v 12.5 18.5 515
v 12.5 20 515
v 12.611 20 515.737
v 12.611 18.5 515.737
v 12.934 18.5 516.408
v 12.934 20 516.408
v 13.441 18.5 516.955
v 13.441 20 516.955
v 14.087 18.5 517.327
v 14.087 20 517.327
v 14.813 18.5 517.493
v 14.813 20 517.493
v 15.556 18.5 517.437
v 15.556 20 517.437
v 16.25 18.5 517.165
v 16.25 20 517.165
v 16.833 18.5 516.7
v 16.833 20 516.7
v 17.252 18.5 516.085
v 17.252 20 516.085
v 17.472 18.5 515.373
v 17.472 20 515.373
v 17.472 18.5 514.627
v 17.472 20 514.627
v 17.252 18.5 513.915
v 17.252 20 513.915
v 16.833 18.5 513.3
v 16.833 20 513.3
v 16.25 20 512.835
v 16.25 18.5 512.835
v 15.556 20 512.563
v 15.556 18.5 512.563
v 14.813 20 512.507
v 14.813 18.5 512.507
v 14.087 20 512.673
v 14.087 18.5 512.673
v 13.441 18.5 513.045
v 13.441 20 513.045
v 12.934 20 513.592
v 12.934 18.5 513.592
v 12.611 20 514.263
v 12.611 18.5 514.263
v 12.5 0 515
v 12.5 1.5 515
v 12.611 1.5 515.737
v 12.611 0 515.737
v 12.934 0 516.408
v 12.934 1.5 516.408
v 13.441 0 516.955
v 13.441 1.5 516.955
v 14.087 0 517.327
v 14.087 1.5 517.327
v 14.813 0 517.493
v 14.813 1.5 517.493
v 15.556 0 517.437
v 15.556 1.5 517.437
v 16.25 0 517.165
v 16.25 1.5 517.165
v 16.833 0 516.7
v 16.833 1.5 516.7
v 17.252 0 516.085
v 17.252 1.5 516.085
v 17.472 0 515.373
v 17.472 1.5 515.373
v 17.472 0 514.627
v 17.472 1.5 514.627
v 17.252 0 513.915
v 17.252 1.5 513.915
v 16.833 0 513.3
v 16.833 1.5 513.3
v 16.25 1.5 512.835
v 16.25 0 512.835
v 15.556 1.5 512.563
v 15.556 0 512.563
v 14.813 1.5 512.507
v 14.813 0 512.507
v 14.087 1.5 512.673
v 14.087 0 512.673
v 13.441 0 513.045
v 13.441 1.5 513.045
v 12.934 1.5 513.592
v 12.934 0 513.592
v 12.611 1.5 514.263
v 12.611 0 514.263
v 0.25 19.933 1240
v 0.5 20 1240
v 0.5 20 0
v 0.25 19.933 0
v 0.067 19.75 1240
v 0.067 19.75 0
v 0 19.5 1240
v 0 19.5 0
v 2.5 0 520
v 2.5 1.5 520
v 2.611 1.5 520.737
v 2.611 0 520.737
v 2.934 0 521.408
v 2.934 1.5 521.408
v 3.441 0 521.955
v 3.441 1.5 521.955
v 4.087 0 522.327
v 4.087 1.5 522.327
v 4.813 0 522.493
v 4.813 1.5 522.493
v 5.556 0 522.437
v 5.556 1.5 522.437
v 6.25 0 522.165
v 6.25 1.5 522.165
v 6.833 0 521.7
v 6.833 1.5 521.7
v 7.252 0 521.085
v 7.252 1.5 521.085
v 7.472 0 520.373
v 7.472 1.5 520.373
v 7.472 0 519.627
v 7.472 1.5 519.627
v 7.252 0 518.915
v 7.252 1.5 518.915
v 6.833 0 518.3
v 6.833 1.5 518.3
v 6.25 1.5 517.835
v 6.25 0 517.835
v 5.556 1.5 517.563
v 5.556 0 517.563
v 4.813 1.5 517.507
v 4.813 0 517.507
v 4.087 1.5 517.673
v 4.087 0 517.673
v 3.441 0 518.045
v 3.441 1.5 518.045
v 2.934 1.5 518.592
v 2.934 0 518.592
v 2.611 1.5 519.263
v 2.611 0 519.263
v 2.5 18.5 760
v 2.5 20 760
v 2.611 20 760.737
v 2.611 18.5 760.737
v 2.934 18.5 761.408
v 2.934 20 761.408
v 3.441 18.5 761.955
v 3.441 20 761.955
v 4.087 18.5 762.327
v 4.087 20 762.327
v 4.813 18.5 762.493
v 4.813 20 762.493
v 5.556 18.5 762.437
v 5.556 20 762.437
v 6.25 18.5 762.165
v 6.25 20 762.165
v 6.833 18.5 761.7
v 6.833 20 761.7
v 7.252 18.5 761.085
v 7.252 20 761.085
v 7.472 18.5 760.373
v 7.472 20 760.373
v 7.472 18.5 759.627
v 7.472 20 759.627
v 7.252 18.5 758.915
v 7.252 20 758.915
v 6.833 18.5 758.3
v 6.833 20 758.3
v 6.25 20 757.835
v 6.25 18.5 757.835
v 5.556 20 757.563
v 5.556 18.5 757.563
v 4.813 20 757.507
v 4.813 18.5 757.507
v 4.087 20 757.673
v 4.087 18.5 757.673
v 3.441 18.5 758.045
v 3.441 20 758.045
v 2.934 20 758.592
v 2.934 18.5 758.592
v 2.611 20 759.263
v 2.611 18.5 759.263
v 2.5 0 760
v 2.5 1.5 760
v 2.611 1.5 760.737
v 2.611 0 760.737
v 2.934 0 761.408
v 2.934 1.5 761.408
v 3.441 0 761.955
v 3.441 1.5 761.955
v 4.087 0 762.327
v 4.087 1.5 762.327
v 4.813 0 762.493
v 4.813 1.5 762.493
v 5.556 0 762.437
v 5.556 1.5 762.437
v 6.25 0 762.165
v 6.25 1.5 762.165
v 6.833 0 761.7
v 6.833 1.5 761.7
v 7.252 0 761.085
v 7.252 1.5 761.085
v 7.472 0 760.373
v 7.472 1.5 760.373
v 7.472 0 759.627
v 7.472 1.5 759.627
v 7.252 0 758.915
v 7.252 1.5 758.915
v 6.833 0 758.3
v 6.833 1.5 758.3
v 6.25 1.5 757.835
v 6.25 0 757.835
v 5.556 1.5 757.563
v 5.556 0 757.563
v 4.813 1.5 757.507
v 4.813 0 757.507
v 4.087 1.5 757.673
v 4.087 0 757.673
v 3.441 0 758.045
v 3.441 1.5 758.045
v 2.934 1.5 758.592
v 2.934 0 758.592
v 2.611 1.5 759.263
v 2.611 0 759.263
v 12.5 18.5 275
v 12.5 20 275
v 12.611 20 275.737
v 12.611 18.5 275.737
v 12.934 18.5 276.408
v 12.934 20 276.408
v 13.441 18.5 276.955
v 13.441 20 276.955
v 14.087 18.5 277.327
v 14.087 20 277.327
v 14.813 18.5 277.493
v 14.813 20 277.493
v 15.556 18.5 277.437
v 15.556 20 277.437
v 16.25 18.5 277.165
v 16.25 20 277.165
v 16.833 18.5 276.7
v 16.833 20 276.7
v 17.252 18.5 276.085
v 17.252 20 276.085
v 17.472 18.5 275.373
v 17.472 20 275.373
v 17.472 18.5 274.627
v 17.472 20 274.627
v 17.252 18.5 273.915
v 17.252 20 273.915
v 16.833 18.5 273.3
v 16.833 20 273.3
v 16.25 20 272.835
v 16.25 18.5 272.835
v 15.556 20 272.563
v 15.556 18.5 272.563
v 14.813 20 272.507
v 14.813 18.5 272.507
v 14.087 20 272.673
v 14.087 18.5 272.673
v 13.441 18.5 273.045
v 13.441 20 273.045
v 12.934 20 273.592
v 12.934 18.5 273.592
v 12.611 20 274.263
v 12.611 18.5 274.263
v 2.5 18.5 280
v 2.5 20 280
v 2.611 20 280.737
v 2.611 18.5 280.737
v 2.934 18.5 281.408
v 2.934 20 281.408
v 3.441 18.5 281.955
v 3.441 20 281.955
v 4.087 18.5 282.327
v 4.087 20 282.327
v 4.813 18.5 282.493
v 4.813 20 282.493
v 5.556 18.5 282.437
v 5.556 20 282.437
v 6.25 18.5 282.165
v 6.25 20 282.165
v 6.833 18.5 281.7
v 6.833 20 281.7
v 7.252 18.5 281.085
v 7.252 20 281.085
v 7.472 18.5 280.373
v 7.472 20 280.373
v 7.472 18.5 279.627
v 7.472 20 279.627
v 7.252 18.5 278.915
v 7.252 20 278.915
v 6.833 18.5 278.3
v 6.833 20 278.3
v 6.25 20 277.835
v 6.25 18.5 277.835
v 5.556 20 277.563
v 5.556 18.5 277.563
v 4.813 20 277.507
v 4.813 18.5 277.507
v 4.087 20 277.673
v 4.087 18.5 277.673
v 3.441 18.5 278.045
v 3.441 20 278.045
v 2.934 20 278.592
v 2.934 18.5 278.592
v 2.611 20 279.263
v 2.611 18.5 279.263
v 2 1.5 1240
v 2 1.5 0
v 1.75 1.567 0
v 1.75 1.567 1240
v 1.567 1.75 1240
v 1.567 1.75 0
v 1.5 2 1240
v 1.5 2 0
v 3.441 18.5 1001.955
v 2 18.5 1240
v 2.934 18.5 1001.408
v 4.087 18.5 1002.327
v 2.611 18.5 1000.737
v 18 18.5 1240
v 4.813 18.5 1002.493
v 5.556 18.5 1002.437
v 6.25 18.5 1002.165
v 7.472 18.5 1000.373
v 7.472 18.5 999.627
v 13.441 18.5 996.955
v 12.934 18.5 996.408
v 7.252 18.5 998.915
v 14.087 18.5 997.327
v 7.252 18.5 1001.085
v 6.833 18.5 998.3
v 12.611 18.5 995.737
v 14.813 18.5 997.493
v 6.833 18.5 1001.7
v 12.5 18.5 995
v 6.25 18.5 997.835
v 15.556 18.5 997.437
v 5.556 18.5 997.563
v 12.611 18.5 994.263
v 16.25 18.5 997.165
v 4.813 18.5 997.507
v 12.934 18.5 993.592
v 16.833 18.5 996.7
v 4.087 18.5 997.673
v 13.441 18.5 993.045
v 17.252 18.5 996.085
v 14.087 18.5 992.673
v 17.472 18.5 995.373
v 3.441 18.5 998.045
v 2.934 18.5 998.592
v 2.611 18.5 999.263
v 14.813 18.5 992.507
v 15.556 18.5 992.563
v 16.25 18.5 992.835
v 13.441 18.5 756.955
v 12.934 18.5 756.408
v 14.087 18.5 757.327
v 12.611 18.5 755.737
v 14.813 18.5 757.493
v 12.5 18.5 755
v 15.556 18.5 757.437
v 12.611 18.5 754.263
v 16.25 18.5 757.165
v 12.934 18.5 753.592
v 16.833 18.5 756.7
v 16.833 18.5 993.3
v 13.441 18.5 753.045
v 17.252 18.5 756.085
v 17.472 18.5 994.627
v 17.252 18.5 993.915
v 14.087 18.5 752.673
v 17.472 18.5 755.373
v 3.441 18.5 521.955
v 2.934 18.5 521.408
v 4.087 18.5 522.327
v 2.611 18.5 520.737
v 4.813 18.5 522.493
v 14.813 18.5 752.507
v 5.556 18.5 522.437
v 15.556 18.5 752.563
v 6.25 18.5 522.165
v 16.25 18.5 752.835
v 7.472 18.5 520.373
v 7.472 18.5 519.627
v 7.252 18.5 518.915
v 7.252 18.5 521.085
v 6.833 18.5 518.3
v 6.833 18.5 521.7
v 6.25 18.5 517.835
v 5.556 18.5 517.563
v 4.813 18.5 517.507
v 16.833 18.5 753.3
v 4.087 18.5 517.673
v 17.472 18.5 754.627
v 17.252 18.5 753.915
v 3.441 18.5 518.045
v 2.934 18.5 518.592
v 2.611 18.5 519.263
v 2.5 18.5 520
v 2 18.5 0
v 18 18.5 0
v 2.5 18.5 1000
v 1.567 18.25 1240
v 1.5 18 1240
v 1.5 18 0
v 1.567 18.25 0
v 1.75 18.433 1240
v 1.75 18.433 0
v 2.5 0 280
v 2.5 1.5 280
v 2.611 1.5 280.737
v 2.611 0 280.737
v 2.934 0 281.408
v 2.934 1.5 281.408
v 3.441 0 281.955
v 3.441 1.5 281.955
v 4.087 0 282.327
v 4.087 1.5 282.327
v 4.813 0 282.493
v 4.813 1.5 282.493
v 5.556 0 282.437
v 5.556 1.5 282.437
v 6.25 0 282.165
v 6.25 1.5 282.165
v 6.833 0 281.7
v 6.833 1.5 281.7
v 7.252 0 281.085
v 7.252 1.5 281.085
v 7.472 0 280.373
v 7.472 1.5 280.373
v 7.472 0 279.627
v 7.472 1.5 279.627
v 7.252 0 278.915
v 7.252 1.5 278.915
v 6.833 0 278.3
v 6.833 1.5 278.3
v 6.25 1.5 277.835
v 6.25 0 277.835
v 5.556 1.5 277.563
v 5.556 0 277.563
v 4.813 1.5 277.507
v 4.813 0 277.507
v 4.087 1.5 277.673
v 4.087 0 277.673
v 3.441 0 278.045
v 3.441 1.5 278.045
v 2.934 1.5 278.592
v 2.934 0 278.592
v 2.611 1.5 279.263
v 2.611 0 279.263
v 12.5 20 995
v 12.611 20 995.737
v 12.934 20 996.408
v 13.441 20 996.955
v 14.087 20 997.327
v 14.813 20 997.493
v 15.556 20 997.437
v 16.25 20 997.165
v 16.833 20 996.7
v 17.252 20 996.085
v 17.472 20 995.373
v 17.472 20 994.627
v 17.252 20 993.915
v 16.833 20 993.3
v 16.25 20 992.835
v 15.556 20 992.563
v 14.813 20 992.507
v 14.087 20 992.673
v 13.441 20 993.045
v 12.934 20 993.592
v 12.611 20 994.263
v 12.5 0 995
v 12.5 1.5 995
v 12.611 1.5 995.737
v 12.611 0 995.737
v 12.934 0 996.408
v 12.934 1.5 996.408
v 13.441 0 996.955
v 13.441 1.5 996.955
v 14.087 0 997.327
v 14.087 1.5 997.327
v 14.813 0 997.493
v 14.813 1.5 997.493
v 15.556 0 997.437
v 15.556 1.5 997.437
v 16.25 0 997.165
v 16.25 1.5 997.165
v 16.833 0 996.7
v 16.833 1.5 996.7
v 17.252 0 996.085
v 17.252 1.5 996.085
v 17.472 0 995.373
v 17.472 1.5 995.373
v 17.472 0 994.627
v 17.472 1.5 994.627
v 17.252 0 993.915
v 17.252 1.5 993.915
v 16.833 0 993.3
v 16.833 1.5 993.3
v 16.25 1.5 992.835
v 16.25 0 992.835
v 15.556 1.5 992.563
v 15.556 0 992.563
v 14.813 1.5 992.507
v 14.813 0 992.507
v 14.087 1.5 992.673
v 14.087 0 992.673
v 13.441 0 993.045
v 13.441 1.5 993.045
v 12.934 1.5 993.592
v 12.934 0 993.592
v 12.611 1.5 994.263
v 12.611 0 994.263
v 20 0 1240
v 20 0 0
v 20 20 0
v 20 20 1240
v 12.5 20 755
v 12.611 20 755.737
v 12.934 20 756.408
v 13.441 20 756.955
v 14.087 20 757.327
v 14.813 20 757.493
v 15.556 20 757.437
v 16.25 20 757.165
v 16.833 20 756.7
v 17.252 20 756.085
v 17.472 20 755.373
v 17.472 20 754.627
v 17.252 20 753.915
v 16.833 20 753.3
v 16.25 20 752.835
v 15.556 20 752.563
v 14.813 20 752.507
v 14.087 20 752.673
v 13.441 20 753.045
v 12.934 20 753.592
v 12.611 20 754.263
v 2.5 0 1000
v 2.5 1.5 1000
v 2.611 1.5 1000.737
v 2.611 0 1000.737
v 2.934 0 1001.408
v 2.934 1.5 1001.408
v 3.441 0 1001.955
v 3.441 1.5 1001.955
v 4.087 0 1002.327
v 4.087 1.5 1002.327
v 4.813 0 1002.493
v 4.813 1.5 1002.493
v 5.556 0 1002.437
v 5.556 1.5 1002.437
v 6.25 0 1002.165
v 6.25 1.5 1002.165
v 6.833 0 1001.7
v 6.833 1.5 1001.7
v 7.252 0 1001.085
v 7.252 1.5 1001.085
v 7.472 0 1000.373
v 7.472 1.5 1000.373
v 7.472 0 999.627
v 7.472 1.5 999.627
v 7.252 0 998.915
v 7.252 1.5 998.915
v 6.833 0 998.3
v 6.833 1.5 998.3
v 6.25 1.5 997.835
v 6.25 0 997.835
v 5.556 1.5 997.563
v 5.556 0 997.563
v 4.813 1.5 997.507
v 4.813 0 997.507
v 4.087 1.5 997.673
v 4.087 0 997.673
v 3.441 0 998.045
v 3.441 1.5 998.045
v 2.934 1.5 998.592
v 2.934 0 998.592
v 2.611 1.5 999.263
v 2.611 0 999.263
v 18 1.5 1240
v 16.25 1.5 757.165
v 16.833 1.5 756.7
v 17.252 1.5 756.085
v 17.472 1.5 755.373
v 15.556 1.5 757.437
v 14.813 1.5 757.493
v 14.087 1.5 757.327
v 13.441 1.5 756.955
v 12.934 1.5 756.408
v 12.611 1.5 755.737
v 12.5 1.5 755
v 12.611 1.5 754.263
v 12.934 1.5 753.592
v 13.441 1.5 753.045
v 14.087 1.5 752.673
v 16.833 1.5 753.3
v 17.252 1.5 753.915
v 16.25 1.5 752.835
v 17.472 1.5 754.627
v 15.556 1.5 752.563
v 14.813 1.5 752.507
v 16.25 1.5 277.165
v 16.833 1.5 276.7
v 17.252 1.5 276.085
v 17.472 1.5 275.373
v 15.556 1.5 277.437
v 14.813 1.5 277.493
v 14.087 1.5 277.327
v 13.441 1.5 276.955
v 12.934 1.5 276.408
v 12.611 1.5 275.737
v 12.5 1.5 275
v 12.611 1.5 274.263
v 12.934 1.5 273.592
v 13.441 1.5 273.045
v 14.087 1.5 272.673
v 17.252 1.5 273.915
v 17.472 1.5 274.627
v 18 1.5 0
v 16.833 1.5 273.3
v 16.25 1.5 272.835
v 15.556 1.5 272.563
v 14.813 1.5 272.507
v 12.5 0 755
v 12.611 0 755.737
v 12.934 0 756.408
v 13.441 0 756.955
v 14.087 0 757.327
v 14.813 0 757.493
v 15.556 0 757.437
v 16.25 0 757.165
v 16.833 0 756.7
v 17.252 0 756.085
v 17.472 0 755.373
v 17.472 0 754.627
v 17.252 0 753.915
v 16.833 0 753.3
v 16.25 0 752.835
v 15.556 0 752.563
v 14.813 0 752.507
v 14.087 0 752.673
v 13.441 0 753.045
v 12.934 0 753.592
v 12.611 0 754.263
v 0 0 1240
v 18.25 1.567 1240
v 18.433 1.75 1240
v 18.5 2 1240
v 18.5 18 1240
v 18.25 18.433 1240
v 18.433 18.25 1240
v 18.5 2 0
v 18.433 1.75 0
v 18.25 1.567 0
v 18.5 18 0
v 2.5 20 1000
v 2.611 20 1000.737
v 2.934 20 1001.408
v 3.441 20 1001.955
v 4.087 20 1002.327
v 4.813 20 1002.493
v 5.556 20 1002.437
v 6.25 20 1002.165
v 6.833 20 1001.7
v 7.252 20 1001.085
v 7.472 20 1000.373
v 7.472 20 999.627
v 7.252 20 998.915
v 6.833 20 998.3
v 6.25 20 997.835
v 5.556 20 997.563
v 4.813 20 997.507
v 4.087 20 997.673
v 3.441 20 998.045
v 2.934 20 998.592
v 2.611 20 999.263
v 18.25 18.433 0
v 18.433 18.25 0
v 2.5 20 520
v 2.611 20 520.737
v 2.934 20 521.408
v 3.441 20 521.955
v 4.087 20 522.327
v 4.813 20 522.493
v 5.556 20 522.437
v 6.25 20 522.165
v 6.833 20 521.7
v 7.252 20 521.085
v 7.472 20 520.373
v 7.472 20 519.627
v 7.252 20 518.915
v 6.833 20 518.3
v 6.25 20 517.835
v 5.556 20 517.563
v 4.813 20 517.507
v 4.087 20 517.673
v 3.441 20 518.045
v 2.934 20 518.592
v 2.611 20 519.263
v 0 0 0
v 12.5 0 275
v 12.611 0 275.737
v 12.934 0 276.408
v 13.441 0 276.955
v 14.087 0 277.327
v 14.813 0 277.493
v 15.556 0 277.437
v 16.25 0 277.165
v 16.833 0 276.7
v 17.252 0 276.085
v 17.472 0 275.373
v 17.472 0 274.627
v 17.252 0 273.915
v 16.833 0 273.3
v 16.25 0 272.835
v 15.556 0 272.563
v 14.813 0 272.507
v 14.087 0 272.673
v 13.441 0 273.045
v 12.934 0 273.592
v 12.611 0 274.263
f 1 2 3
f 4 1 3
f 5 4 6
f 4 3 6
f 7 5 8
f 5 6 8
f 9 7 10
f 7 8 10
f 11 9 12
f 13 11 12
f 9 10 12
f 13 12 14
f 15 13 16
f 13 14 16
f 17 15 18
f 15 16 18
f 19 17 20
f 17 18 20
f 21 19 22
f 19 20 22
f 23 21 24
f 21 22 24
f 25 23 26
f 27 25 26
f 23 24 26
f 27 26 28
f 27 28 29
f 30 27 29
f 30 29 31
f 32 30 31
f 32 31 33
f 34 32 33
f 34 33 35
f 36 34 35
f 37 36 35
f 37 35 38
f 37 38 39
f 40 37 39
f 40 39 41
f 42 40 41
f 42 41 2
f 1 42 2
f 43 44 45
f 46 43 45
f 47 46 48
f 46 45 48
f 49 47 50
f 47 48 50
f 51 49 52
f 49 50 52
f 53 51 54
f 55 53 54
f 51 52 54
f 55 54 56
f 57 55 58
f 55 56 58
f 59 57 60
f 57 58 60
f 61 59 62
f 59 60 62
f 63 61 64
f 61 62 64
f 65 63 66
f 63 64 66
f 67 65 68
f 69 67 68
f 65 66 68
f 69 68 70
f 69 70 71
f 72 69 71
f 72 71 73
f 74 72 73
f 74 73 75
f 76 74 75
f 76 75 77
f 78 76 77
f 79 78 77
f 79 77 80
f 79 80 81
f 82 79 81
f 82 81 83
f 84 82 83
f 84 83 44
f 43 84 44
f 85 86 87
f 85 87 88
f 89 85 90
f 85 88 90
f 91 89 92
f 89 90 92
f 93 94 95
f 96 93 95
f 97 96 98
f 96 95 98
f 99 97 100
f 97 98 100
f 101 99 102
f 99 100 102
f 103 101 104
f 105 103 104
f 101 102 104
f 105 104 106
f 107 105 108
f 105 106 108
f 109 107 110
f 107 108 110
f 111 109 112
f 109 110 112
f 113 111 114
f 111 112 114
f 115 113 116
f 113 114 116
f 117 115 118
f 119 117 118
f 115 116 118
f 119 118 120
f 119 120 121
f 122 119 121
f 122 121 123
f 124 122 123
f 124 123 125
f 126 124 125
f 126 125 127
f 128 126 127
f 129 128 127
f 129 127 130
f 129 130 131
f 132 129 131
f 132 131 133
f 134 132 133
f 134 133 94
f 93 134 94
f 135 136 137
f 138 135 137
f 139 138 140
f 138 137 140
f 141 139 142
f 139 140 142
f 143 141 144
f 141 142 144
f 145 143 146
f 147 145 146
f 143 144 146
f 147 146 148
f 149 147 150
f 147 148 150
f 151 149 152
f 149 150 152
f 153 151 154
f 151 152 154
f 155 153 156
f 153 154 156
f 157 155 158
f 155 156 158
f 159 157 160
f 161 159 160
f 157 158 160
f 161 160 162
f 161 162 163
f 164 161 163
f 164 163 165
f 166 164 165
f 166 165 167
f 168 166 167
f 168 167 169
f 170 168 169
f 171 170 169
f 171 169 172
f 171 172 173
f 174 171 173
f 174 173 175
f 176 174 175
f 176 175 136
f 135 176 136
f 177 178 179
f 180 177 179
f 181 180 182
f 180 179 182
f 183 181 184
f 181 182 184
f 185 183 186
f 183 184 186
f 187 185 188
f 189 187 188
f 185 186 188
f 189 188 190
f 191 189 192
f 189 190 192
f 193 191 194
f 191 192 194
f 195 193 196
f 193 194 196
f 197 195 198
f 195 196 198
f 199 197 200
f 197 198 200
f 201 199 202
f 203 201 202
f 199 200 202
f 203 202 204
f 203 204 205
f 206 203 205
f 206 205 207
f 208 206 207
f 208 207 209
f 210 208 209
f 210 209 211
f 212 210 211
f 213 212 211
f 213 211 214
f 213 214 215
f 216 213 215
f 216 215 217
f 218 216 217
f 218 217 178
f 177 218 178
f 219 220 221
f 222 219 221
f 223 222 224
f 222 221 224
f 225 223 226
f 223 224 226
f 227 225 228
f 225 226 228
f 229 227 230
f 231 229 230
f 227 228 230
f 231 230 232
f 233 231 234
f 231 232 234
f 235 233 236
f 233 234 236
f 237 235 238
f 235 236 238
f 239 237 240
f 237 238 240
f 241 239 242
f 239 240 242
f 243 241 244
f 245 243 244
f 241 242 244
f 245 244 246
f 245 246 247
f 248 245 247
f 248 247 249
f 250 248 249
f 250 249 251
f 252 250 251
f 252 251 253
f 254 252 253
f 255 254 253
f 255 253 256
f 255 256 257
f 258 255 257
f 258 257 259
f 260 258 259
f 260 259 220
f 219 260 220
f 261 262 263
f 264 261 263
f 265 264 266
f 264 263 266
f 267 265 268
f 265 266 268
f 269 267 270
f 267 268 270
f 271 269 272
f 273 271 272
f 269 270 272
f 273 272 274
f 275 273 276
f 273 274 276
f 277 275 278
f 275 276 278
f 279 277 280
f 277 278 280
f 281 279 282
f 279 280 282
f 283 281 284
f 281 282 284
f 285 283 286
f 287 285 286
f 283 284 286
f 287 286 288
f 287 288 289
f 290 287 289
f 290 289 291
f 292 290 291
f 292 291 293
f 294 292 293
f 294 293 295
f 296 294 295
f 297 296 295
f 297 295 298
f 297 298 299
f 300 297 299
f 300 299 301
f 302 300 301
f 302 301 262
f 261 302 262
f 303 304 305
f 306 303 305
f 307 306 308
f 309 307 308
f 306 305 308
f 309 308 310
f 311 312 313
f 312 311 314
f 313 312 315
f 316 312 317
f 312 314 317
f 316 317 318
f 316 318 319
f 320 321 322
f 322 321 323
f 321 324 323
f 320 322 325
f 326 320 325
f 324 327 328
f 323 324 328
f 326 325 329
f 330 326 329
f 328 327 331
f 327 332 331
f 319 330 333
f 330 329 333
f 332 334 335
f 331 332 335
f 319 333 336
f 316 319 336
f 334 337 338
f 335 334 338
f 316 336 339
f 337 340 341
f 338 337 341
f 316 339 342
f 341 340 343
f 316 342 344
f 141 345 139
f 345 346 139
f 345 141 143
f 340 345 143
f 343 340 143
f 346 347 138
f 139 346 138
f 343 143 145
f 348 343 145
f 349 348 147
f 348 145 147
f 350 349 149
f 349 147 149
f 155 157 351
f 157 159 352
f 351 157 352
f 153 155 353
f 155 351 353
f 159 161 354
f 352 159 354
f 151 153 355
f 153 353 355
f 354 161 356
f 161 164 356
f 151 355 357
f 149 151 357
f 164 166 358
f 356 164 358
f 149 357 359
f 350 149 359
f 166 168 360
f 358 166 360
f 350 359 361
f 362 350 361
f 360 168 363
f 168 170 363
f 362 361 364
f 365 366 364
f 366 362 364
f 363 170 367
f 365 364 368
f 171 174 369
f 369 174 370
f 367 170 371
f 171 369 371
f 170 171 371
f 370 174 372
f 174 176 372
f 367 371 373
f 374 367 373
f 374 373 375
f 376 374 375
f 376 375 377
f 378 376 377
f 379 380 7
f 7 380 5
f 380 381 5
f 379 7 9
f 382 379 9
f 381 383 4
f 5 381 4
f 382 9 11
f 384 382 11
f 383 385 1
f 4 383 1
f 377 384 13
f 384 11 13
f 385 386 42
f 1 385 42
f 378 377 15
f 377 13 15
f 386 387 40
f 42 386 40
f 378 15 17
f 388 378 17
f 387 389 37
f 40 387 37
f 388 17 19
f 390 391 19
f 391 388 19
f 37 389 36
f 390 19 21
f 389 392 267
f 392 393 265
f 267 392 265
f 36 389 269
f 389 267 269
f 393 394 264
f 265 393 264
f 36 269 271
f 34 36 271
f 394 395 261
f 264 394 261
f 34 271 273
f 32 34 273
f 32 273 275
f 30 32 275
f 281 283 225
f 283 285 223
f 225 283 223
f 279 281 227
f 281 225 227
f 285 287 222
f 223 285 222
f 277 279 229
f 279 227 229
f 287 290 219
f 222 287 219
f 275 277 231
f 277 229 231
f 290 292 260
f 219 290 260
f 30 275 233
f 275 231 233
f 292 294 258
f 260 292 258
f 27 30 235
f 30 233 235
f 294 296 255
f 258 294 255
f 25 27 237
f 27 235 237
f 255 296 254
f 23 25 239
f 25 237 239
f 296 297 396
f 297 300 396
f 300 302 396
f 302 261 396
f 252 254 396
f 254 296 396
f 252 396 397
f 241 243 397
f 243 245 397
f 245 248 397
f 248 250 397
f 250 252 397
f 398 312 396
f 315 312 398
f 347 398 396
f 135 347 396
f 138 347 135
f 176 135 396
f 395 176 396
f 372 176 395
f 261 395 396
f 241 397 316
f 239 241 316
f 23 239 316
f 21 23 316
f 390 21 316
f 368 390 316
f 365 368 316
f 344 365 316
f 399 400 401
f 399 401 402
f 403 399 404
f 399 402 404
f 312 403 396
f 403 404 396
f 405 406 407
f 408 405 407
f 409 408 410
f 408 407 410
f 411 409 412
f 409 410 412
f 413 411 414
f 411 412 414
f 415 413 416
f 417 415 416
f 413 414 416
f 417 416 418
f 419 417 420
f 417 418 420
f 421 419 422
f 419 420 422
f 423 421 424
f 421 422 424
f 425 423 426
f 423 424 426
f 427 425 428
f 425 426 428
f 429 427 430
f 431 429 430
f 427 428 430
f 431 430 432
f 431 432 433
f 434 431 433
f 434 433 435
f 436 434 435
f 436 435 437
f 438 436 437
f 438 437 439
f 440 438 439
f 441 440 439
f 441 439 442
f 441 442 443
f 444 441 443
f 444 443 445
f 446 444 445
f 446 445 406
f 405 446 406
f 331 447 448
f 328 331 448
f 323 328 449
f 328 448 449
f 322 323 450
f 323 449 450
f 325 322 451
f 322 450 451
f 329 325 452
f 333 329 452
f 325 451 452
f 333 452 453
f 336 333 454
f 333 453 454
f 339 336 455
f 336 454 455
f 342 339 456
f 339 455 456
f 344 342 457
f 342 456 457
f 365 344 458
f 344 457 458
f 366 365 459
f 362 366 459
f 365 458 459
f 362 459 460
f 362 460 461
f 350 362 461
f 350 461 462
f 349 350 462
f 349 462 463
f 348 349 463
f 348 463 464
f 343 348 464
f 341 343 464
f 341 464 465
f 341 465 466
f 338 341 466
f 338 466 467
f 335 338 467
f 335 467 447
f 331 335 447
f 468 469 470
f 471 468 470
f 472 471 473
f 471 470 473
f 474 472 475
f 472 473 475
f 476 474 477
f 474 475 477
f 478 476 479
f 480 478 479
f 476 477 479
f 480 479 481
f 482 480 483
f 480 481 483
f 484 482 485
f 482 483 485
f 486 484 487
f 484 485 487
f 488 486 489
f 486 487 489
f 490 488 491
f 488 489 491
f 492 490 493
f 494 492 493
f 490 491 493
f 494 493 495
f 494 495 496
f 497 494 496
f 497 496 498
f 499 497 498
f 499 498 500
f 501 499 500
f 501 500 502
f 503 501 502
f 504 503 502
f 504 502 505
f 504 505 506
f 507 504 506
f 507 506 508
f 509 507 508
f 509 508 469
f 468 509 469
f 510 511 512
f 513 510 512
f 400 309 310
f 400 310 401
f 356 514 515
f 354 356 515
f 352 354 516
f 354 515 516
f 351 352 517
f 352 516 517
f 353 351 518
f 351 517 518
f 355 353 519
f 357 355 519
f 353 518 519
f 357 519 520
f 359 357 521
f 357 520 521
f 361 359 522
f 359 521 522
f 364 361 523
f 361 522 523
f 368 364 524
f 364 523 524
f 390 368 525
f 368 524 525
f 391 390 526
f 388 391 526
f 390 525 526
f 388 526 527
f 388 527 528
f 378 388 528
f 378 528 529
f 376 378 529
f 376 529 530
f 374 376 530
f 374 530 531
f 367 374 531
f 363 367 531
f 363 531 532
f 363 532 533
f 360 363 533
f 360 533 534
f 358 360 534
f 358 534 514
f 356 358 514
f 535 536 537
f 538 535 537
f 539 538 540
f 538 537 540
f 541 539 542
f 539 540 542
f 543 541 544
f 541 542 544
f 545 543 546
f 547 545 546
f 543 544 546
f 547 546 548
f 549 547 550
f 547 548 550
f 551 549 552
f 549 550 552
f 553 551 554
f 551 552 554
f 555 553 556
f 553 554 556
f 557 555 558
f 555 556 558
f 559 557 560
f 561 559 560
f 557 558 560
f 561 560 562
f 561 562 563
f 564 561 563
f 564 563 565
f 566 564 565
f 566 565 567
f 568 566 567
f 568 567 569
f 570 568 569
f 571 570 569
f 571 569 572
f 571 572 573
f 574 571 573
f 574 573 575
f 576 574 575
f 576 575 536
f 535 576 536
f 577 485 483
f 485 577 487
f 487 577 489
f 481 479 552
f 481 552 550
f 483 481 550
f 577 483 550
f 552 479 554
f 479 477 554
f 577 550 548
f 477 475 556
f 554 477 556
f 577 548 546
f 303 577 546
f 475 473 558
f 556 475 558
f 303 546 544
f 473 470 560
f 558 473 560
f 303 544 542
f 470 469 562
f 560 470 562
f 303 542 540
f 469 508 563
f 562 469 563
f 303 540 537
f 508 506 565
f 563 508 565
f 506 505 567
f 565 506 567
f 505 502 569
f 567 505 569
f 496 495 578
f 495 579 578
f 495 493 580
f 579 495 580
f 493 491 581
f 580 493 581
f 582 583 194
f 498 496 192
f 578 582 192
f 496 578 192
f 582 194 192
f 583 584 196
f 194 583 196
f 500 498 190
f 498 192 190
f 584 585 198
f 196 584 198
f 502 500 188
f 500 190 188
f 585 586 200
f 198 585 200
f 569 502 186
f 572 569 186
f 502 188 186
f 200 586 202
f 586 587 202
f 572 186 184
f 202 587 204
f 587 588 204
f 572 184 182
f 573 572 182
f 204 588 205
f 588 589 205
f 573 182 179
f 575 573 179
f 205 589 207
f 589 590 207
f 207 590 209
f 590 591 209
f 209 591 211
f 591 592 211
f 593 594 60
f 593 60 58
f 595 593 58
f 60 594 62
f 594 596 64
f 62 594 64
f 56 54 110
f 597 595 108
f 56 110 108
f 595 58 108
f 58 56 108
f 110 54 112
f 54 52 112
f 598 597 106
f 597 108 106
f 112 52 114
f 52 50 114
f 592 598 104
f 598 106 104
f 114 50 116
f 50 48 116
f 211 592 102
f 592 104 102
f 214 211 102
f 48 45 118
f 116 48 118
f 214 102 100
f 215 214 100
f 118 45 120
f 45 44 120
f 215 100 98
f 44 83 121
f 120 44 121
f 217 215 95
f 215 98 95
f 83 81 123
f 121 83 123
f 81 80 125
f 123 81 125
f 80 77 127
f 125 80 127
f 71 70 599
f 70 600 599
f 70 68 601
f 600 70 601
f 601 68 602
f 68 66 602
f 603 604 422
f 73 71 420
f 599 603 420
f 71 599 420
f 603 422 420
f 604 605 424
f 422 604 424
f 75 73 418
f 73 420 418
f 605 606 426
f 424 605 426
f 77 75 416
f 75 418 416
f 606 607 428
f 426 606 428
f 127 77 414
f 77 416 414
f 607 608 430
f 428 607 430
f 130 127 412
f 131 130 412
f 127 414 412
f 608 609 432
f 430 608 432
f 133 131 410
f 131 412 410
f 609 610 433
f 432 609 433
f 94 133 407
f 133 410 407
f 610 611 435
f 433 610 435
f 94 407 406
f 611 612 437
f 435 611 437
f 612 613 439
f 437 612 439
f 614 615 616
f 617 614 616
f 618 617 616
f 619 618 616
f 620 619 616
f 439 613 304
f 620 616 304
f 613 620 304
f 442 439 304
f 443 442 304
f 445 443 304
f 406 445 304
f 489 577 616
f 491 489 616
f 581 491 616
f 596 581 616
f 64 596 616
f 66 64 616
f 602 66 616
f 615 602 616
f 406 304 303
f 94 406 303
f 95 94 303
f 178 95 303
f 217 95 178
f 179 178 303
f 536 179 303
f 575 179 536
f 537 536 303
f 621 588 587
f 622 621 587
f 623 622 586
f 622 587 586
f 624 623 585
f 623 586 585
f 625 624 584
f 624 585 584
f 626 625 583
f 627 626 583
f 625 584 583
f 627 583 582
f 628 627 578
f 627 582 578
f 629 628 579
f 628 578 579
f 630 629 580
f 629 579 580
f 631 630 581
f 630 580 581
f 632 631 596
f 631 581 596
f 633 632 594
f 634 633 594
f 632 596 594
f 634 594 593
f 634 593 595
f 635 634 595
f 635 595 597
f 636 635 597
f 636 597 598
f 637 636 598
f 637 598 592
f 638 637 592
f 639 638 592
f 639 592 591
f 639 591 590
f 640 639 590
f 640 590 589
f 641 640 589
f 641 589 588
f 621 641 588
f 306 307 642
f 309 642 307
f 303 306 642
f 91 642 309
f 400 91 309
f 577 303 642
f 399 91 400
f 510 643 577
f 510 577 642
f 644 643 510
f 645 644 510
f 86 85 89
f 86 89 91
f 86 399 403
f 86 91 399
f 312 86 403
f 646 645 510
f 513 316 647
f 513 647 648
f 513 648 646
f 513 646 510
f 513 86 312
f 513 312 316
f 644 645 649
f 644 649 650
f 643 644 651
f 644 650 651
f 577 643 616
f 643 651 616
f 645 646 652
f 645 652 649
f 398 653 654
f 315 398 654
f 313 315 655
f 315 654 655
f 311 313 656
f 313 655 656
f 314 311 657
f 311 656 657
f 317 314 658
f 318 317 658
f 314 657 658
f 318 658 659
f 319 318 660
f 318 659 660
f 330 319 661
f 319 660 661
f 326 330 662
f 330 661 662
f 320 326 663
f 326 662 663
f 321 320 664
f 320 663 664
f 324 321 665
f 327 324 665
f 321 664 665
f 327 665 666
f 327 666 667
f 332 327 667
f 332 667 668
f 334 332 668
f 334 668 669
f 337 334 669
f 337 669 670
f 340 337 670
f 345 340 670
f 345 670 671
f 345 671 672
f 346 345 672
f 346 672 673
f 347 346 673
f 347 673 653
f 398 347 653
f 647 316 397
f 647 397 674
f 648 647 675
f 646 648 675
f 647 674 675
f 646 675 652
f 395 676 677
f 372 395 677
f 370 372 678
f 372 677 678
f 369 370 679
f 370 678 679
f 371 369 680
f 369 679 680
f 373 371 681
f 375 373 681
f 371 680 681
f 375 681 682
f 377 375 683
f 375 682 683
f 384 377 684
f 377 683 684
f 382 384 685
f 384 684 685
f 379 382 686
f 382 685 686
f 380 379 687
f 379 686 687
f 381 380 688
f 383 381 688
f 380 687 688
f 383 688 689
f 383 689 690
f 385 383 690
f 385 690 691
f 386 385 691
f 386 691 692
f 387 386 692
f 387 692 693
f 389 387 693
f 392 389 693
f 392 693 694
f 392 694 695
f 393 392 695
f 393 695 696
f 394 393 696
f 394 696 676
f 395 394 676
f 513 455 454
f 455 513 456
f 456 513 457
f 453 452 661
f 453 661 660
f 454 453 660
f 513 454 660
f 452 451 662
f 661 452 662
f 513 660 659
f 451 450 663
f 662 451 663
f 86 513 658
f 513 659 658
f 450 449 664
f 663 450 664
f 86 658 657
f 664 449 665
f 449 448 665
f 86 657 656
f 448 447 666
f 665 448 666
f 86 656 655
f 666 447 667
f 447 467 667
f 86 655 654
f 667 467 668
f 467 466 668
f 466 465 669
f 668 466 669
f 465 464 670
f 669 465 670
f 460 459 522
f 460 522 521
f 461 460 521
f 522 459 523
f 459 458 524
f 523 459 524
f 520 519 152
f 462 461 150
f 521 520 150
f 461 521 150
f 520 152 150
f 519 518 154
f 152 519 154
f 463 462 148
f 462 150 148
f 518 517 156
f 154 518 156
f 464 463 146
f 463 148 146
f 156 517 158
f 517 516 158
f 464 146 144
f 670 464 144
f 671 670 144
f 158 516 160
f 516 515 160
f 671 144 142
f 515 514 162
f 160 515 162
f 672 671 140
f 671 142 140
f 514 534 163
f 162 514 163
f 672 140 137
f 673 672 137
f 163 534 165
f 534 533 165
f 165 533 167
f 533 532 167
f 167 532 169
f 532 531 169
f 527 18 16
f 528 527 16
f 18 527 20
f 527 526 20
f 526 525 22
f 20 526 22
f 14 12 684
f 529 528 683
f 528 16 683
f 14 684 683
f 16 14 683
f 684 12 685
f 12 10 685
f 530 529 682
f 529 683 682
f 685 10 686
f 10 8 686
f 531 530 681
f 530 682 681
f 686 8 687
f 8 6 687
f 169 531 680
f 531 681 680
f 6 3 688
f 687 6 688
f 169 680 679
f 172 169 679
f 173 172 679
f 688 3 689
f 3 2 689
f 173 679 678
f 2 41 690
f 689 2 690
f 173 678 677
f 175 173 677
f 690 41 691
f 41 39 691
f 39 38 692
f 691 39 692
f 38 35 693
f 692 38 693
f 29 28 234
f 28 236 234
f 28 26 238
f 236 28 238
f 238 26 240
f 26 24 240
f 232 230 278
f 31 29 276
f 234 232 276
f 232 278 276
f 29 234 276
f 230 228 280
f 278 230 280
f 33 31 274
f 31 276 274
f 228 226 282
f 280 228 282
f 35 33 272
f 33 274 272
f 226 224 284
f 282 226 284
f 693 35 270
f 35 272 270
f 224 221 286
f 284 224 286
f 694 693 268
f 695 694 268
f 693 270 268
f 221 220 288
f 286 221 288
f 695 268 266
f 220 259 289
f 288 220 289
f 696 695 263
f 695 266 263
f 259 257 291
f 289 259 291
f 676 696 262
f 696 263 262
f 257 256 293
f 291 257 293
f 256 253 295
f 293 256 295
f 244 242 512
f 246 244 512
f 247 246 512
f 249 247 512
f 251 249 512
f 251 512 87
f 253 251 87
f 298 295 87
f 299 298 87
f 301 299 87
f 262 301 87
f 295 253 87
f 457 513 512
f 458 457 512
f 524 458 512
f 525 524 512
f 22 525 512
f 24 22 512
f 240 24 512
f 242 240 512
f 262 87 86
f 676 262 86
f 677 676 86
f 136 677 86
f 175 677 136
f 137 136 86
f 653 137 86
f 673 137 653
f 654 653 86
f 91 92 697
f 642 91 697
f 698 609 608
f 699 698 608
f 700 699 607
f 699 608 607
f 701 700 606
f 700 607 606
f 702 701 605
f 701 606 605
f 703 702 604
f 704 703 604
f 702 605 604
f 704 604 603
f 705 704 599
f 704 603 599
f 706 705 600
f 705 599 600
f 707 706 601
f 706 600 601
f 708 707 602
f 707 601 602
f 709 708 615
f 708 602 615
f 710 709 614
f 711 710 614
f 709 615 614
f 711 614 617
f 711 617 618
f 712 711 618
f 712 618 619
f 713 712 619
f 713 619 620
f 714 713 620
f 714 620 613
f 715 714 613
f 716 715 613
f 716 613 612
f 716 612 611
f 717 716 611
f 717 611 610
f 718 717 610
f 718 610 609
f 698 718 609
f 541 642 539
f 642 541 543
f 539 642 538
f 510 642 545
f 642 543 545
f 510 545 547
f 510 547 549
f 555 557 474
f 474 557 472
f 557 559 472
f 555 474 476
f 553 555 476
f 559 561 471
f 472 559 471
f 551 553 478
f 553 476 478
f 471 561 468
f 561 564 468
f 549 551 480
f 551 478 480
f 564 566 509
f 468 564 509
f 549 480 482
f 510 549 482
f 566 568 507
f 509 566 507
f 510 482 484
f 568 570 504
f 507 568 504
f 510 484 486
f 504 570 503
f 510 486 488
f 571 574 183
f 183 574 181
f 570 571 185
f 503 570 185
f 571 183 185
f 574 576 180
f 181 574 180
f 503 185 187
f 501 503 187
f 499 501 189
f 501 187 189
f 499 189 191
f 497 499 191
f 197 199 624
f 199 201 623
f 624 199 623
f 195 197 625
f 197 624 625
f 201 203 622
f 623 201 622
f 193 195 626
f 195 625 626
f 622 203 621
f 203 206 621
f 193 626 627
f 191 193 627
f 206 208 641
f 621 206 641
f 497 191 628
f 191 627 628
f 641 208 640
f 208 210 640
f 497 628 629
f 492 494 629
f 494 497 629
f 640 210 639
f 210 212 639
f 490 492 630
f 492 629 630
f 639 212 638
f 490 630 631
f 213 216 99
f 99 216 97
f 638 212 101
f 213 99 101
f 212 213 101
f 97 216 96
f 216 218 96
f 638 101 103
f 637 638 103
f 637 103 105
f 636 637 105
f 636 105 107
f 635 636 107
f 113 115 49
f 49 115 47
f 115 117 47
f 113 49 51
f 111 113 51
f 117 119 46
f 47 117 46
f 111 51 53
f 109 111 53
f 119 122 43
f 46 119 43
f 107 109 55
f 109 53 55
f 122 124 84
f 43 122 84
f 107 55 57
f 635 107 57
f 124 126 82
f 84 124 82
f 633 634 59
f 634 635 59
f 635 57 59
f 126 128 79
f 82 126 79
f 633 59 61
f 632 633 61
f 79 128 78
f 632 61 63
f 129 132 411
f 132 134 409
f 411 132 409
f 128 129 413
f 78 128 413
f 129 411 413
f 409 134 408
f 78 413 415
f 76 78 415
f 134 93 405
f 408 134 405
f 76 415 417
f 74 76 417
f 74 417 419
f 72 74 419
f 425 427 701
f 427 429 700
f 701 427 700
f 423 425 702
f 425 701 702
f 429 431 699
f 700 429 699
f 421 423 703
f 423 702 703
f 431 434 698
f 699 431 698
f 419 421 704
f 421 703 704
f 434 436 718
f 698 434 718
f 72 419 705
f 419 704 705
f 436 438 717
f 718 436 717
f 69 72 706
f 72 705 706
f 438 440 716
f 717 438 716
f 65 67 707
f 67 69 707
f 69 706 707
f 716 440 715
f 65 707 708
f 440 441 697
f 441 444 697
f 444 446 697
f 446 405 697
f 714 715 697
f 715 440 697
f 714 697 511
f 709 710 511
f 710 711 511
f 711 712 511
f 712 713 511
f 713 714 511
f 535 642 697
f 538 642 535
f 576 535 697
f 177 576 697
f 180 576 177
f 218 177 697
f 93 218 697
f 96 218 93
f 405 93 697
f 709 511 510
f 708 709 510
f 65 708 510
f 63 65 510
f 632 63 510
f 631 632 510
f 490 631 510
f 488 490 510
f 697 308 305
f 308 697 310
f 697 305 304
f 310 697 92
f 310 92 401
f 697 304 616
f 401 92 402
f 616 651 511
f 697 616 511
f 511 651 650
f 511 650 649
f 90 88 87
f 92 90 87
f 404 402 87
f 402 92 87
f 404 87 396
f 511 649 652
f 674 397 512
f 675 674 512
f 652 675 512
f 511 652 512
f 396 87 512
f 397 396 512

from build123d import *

# Parameters (mm, degrees)
F1_DEPTH = 1240
F3_D     = 5


with BuildPart() as f1:
    # F0 (on Top) → F1 (new body)
    with BuildSketch(Plane.XY):
        with BuildLine():
            Line((0, 19.5), (0, 0))
            Line((0, 0), (20, 0))
            Line((20, 0), (20, 20))
            Line((20, 20), (0.5, 20))
            ThreePointArc((0.5, 20), (0.146447, 19.853553), (0, 19.5))
        make_face()
        with BuildLine():
            ThreePointArc((1.5, 18), (1.646447, 18.353553), (2, 18.5))
            Line((2, 18.5), (18, 18.5))
            ThreePointArc((18, 18.5), (18.353553, 18.353553), (18.5, 18))
            Line((18.5, 18), (18.5, 2))
            ThreePointArc((18.5, 2), (18.353553, 1.646447), (18, 1.5))
            Line((18, 1.5), (2, 1.5))
            ThreePointArc((2, 1.5), (1.646447, 1.646447), (1.5, 2))
            Line((1.5, 2), (1.5, 18))
        make_face(mode=Mode.SUBTRACT)
    extrude(amount=F1_DEPTH)

    # F3 (through all)
    with Locations(Plane.XZ):
        with Locations((5, 1000), (15, 995), (5, 760), (15, 755), (5, 520), (15, 515), (5, 280), (15, 275)):
            Hole(F3_D / 2)


solid = f1.part
